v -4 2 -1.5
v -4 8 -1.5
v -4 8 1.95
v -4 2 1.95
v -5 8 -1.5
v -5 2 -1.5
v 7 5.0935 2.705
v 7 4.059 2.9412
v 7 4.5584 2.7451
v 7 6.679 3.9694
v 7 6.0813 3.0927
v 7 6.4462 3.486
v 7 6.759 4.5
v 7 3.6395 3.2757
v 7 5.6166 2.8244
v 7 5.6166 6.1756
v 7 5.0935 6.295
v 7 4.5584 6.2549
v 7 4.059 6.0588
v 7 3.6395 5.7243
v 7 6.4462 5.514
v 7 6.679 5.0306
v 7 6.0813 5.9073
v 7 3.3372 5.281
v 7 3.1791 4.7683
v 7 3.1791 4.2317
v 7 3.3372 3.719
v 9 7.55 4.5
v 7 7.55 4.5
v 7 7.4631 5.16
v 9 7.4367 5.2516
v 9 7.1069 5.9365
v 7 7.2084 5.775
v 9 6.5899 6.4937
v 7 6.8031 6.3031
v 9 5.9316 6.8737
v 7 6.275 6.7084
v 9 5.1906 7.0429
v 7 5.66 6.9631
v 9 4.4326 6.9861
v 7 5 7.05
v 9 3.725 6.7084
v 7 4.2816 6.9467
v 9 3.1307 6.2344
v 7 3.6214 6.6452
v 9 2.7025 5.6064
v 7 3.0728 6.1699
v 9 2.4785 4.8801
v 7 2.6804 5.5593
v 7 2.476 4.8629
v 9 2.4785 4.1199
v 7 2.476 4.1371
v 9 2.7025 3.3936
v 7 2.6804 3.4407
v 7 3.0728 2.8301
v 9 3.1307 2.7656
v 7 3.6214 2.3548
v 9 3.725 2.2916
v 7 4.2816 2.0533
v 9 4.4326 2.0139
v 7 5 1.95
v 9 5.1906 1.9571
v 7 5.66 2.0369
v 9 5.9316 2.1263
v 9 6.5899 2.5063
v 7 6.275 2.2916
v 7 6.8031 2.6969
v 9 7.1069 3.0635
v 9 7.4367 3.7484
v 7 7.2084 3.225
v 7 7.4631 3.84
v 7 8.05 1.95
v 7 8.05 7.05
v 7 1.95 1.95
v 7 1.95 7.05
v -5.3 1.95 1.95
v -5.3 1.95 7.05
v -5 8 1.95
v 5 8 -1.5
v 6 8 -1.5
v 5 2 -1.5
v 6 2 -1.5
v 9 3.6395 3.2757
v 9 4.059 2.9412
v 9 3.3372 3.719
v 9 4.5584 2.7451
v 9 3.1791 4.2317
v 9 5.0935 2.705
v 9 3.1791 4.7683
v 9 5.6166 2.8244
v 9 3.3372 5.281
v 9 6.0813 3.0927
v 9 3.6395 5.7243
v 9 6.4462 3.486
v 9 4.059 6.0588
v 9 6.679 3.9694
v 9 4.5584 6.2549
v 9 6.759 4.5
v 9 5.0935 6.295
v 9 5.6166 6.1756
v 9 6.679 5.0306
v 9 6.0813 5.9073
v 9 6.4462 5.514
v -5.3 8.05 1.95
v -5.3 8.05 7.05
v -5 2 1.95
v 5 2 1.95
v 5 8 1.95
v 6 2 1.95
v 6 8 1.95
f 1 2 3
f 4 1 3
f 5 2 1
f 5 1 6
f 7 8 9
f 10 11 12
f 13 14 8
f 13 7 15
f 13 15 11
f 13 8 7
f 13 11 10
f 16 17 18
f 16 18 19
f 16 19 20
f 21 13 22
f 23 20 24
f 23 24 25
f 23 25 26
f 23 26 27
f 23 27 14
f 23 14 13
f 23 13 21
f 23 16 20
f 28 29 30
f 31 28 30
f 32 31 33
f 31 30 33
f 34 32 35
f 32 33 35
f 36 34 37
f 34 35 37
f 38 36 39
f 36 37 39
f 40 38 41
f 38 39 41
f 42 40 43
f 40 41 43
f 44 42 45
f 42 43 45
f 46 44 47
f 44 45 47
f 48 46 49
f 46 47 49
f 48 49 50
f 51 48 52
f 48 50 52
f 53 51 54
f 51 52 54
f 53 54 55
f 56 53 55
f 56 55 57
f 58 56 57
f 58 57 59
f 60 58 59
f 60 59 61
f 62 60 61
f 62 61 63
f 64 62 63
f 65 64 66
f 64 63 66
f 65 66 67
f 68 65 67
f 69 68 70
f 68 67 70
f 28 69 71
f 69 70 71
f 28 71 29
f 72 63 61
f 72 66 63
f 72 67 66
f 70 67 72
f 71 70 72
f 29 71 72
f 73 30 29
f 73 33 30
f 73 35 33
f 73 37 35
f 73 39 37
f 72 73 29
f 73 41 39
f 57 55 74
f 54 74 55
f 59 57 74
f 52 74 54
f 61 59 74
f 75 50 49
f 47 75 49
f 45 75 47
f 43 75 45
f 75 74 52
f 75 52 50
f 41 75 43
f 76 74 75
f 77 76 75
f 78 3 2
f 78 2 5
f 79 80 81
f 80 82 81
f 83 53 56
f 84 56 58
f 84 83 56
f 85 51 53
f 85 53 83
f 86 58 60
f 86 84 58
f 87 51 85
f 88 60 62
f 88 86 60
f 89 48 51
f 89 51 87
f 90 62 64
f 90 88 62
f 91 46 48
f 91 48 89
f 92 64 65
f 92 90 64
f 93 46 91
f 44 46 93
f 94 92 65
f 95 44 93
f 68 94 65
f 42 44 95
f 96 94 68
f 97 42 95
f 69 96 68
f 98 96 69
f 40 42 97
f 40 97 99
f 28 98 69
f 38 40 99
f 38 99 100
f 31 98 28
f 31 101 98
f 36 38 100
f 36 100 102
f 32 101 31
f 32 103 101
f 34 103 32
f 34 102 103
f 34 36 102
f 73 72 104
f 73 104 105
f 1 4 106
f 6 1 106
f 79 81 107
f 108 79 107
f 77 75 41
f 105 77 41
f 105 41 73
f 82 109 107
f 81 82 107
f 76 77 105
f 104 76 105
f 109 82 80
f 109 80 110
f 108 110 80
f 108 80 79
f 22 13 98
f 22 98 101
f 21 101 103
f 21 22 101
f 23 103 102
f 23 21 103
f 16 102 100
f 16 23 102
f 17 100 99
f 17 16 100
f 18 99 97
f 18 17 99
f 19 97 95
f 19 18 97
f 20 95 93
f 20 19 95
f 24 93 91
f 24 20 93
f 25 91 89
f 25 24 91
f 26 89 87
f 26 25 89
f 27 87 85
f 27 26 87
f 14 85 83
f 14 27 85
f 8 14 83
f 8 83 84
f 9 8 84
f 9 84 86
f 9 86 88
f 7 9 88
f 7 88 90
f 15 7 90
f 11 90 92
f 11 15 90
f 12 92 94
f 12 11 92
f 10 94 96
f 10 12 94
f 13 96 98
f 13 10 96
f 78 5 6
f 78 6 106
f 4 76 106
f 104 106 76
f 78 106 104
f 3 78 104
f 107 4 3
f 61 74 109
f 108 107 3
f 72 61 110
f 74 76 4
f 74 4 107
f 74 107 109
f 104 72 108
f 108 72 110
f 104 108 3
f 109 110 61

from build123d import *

# Parameters (mm, degrees)
SKETCH005_W             = 6.1
SKETCH005_H             = 5.1
PAD005_DEPTH            = 12.3
SKETCH006_R             = 2.55
SKETCH006_R_2           = 1.8
PAD006_DEPTH            = 2
SKETCH007_W             = 1
SKETCH007_H             = 6
PAD007_DEPTH            = 3
BODY002_PLACEMENT_ANGLE = 90


with BuildPart() as part:
    # Sketch005 → Pad005 (new body)
    with BuildSketch(Plane.XZ):
        Rectangle(SKETCH005_W, SKETCH005_H)
    extrude(amount=-PAD005_DEPTH)

    # Sketch006 → Pad006 (join)
    with BuildSketch(Plane.XZ):
        Circle(SKETCH006_R)
        with Locations((-0.041022, 0)):
            Circle(SKETCH006_R_2, mode=Mode.SUBTRACT)
    extrude(amount=PAD006_DEPTH)

    # Sketch007 → Pad007 (join, symmetric)
    with BuildSketch(Plane.YZ):
        with Locations((1.5, -3)):
            Rectangle(SKETCH007_W, SKETCH007_H)
        with Locations((11.5, -3)):
            Rectangle(SKETCH007_W, SKETCH007_H)
    extrude(amount=PAD007_DEPTH, both=True)


with BuildPart() as part_1:
    # Body002 placement: moved
    add(part.part.moved(Location((7, 5, 4.5))).rotate(Axis((7, 5, 4.5), (0, 0, 1)), BODY002_PLACEMENT_ANGLE))


solid = part_1.part
